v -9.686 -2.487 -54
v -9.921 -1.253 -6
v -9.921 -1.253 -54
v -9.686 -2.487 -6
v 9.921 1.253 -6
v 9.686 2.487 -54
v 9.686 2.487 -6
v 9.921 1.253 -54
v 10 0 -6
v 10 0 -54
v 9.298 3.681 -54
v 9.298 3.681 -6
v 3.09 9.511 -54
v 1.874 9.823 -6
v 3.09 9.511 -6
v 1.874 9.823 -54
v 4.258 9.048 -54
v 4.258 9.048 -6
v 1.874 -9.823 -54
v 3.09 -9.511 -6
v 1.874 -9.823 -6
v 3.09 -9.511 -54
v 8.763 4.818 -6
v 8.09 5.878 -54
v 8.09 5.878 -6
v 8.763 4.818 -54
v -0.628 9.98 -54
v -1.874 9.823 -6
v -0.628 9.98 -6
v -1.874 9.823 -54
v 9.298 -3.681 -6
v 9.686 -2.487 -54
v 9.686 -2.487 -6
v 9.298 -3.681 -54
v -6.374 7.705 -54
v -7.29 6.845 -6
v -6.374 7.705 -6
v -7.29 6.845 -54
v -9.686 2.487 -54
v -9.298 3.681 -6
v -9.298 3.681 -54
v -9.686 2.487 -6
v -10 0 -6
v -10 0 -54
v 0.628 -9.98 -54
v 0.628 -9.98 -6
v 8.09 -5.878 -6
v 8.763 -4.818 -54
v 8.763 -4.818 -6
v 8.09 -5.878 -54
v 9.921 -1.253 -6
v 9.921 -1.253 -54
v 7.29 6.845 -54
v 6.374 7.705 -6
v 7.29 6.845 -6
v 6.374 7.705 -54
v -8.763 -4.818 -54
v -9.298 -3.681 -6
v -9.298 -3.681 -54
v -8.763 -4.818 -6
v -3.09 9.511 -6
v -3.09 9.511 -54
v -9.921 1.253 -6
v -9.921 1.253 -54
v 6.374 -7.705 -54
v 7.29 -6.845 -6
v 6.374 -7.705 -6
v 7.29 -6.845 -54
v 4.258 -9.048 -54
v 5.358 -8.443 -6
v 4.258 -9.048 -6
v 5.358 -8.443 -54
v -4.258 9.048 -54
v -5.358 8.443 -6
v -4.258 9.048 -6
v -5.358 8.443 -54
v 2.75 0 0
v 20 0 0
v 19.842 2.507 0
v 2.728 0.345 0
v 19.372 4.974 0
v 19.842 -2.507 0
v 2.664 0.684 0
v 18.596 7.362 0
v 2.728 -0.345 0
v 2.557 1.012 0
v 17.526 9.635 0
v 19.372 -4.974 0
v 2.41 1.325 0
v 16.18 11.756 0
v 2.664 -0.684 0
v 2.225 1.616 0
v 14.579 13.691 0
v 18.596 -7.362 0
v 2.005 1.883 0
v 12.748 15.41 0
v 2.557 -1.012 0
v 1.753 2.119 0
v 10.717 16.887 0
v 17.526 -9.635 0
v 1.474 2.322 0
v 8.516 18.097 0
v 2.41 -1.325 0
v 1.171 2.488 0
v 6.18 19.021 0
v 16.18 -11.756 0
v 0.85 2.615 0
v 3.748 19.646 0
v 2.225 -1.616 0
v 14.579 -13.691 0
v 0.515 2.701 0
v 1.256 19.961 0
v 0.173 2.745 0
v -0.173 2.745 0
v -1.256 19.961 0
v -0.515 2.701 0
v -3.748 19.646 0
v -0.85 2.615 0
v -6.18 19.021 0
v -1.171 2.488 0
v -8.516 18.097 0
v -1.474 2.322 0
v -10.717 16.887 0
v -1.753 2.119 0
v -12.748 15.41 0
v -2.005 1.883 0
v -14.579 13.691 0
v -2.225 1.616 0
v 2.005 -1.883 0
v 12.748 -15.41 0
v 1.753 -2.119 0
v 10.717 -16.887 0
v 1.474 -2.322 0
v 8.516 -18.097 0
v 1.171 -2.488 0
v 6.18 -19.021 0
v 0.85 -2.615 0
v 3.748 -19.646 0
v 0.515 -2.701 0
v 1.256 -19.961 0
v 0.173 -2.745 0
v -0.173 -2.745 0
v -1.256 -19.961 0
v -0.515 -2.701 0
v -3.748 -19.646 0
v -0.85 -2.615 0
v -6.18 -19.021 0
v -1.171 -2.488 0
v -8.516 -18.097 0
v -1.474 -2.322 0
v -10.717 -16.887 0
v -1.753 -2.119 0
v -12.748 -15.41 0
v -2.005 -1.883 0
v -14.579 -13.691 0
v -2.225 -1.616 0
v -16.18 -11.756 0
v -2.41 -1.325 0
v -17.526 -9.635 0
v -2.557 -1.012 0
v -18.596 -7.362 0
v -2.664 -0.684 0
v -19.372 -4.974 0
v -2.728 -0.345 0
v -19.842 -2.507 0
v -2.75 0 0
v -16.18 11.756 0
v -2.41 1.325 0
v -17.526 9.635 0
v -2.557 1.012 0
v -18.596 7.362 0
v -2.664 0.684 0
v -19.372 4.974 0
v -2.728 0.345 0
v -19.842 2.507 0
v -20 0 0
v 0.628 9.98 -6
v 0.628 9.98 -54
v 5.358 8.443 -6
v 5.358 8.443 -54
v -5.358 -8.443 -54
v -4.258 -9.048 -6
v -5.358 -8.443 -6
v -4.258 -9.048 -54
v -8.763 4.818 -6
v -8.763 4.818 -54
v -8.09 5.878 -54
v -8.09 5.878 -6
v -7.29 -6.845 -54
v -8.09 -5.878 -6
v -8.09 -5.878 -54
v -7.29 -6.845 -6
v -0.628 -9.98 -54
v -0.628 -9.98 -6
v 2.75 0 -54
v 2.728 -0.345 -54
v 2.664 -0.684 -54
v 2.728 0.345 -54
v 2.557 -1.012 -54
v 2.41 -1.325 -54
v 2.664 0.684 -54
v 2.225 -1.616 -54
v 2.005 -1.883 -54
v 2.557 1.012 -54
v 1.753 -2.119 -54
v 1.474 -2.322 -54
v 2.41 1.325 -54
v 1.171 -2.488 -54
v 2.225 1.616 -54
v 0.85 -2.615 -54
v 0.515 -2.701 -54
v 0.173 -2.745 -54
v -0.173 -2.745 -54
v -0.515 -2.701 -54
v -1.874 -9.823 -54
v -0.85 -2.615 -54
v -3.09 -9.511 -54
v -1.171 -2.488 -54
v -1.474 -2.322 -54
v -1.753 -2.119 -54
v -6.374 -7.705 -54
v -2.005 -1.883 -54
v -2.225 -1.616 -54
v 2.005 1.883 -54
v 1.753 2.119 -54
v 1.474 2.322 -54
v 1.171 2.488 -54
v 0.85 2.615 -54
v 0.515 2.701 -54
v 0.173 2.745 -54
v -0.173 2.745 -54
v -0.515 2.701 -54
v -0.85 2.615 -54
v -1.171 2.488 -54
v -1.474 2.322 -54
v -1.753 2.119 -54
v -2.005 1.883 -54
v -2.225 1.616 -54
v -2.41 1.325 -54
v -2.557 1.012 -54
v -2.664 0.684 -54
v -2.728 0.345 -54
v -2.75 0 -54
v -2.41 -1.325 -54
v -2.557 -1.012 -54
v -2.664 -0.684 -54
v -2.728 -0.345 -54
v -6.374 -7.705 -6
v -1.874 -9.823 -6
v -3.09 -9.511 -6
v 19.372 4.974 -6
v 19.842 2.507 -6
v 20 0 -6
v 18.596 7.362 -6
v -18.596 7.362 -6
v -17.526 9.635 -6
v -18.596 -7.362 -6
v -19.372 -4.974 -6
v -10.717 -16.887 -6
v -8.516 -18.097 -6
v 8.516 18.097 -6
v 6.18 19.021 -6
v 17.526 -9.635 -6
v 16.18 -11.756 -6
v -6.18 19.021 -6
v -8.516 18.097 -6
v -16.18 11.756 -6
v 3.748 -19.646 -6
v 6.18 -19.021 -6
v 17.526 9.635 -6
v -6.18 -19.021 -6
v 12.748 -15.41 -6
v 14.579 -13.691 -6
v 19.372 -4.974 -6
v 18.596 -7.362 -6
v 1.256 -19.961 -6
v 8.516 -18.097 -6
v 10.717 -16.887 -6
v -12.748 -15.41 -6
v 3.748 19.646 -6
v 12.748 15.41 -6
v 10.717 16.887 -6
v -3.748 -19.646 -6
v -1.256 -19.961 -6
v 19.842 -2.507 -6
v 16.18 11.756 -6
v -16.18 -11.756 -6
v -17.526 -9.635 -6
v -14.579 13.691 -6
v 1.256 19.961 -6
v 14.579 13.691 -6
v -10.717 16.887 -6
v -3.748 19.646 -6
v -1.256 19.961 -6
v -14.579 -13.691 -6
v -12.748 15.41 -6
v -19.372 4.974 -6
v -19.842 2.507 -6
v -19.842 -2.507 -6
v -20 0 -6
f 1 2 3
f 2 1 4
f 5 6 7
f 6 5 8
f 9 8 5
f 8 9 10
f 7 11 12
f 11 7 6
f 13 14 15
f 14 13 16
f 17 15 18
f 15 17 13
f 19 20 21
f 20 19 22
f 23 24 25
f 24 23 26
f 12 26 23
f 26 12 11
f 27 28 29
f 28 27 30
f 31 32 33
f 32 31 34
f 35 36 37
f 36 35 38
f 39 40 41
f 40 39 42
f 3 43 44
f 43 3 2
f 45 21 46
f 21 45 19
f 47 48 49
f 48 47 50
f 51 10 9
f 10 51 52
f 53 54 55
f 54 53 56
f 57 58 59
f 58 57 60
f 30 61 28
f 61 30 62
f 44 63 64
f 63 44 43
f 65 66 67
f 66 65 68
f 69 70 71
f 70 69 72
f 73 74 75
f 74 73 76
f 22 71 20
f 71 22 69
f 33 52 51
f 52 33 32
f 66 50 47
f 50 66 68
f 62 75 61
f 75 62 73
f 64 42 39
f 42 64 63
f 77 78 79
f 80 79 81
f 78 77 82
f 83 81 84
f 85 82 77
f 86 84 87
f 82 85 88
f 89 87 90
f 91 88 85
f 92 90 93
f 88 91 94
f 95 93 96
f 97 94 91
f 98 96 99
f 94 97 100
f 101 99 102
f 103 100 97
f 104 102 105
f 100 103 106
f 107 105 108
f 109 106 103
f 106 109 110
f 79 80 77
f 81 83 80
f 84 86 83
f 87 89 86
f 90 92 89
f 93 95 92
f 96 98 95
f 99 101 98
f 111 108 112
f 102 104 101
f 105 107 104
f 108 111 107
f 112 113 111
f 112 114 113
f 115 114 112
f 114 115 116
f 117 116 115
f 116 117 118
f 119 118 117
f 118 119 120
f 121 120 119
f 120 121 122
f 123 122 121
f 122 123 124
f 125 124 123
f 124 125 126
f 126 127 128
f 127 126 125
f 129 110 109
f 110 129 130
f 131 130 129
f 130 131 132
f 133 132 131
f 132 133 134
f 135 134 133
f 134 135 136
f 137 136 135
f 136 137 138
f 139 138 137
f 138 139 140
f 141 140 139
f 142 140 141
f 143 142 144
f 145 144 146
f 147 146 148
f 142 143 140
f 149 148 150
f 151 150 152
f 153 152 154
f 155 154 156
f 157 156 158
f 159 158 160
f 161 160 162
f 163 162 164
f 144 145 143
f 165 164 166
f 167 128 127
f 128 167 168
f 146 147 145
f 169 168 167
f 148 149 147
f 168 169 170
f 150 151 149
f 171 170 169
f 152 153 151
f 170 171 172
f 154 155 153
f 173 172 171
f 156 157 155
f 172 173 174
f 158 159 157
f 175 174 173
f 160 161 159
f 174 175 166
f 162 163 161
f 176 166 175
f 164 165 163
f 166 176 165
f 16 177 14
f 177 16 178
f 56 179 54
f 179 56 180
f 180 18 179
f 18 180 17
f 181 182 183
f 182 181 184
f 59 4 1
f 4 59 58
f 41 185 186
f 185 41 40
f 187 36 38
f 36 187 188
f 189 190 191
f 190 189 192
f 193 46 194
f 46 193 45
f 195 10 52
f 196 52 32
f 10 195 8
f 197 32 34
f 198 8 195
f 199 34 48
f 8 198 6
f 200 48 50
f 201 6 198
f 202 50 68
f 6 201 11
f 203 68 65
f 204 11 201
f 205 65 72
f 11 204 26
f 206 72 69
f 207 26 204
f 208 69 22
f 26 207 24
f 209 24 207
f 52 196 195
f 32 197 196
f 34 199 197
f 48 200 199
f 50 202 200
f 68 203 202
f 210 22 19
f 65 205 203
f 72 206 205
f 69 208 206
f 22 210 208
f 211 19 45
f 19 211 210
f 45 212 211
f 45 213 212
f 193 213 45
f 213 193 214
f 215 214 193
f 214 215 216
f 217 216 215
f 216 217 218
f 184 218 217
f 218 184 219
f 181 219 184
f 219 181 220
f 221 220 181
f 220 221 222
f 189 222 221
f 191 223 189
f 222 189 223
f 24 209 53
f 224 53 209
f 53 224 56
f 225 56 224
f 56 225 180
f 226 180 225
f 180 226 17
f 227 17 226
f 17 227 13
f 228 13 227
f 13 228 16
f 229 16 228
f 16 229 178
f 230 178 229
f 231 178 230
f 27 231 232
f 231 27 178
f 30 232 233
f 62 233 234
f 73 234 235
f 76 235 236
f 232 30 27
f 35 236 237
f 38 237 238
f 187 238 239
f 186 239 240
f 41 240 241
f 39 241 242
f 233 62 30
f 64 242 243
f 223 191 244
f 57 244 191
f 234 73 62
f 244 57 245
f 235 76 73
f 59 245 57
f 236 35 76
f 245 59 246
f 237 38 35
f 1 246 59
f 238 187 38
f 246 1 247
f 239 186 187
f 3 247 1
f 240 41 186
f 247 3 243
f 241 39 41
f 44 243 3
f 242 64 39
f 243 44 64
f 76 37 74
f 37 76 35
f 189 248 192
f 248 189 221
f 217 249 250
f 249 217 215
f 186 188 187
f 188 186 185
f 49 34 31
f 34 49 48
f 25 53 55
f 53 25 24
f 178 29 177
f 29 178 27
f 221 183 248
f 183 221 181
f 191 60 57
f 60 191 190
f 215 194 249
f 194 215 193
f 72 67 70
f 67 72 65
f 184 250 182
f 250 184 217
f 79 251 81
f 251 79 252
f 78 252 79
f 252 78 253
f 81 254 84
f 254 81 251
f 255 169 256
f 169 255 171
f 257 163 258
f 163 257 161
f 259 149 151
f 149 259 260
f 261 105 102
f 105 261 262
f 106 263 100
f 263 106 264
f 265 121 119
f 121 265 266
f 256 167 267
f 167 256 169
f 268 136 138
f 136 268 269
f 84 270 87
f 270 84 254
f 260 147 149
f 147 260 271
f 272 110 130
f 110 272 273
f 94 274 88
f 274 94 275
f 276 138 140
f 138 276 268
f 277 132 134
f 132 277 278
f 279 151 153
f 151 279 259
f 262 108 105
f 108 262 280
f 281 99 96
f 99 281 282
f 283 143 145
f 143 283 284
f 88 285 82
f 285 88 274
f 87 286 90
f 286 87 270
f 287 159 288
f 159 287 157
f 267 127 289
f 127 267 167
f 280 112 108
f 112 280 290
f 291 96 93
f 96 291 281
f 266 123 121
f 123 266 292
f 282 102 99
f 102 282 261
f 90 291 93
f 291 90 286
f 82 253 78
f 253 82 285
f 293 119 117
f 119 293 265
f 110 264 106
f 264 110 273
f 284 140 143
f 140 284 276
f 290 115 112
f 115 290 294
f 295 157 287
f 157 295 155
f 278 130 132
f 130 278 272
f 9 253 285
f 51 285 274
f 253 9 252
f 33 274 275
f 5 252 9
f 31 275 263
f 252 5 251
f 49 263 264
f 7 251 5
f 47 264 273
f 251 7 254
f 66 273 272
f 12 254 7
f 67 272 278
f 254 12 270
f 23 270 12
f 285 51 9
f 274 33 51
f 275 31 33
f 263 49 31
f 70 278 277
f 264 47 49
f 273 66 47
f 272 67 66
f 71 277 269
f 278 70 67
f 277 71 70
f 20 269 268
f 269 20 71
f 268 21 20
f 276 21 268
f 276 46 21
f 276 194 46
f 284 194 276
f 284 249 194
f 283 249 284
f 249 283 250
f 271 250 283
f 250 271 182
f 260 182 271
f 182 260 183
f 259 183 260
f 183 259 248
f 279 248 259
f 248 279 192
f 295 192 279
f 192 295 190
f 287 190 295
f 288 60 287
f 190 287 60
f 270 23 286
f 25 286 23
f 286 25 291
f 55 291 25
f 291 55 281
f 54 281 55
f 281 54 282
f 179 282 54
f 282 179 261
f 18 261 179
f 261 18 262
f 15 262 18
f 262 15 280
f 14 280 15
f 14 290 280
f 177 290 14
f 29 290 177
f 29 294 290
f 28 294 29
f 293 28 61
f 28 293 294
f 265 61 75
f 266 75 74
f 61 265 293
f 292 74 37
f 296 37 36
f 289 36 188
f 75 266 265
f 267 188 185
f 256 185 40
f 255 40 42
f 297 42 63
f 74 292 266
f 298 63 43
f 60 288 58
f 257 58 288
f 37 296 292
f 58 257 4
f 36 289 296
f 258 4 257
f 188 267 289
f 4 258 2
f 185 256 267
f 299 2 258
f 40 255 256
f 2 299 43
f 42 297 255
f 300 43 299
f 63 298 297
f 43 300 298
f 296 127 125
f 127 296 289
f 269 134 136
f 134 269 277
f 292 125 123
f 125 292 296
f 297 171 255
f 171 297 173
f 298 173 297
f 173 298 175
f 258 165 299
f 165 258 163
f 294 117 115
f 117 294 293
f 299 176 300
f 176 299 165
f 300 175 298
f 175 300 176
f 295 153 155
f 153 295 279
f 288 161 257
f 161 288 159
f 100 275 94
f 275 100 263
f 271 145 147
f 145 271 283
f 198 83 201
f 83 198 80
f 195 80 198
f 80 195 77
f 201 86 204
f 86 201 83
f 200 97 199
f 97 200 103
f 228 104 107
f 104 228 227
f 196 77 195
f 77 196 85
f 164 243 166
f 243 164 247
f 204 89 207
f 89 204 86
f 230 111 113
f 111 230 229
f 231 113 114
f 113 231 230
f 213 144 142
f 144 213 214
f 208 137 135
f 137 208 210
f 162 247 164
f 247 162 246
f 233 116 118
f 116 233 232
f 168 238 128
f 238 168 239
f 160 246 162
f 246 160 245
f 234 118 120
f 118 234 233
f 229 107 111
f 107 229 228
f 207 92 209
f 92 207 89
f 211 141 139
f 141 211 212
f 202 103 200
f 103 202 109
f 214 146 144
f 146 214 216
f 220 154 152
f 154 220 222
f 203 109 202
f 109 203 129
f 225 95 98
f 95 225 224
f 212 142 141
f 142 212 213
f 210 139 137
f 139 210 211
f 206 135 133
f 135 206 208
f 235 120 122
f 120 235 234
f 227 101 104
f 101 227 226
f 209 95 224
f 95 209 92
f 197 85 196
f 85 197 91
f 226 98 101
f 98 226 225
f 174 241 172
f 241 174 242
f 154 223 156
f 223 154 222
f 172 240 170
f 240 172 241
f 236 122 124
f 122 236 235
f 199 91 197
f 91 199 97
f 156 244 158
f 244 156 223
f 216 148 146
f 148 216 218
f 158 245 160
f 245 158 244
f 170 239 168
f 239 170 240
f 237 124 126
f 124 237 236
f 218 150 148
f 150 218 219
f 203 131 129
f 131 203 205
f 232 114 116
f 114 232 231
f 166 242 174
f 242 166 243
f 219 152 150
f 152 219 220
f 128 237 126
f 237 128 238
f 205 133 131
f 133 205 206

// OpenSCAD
$fn = 50;


difference() {
	union() {
		translate(v = [0, 0, -54.0000000000]) {
			cylinder(h = 54, r = 10.0000000000);
		}
		translate(v = [0, 0, -6.0000000000]) {
			cylinder(h = 6, r = 20.0000000000);
		}
	}
	union() {
		#translate(v = [0, 0, -54]) {
			cylinder(h = 54, r = 2.7500000000);
		}
	}
}
